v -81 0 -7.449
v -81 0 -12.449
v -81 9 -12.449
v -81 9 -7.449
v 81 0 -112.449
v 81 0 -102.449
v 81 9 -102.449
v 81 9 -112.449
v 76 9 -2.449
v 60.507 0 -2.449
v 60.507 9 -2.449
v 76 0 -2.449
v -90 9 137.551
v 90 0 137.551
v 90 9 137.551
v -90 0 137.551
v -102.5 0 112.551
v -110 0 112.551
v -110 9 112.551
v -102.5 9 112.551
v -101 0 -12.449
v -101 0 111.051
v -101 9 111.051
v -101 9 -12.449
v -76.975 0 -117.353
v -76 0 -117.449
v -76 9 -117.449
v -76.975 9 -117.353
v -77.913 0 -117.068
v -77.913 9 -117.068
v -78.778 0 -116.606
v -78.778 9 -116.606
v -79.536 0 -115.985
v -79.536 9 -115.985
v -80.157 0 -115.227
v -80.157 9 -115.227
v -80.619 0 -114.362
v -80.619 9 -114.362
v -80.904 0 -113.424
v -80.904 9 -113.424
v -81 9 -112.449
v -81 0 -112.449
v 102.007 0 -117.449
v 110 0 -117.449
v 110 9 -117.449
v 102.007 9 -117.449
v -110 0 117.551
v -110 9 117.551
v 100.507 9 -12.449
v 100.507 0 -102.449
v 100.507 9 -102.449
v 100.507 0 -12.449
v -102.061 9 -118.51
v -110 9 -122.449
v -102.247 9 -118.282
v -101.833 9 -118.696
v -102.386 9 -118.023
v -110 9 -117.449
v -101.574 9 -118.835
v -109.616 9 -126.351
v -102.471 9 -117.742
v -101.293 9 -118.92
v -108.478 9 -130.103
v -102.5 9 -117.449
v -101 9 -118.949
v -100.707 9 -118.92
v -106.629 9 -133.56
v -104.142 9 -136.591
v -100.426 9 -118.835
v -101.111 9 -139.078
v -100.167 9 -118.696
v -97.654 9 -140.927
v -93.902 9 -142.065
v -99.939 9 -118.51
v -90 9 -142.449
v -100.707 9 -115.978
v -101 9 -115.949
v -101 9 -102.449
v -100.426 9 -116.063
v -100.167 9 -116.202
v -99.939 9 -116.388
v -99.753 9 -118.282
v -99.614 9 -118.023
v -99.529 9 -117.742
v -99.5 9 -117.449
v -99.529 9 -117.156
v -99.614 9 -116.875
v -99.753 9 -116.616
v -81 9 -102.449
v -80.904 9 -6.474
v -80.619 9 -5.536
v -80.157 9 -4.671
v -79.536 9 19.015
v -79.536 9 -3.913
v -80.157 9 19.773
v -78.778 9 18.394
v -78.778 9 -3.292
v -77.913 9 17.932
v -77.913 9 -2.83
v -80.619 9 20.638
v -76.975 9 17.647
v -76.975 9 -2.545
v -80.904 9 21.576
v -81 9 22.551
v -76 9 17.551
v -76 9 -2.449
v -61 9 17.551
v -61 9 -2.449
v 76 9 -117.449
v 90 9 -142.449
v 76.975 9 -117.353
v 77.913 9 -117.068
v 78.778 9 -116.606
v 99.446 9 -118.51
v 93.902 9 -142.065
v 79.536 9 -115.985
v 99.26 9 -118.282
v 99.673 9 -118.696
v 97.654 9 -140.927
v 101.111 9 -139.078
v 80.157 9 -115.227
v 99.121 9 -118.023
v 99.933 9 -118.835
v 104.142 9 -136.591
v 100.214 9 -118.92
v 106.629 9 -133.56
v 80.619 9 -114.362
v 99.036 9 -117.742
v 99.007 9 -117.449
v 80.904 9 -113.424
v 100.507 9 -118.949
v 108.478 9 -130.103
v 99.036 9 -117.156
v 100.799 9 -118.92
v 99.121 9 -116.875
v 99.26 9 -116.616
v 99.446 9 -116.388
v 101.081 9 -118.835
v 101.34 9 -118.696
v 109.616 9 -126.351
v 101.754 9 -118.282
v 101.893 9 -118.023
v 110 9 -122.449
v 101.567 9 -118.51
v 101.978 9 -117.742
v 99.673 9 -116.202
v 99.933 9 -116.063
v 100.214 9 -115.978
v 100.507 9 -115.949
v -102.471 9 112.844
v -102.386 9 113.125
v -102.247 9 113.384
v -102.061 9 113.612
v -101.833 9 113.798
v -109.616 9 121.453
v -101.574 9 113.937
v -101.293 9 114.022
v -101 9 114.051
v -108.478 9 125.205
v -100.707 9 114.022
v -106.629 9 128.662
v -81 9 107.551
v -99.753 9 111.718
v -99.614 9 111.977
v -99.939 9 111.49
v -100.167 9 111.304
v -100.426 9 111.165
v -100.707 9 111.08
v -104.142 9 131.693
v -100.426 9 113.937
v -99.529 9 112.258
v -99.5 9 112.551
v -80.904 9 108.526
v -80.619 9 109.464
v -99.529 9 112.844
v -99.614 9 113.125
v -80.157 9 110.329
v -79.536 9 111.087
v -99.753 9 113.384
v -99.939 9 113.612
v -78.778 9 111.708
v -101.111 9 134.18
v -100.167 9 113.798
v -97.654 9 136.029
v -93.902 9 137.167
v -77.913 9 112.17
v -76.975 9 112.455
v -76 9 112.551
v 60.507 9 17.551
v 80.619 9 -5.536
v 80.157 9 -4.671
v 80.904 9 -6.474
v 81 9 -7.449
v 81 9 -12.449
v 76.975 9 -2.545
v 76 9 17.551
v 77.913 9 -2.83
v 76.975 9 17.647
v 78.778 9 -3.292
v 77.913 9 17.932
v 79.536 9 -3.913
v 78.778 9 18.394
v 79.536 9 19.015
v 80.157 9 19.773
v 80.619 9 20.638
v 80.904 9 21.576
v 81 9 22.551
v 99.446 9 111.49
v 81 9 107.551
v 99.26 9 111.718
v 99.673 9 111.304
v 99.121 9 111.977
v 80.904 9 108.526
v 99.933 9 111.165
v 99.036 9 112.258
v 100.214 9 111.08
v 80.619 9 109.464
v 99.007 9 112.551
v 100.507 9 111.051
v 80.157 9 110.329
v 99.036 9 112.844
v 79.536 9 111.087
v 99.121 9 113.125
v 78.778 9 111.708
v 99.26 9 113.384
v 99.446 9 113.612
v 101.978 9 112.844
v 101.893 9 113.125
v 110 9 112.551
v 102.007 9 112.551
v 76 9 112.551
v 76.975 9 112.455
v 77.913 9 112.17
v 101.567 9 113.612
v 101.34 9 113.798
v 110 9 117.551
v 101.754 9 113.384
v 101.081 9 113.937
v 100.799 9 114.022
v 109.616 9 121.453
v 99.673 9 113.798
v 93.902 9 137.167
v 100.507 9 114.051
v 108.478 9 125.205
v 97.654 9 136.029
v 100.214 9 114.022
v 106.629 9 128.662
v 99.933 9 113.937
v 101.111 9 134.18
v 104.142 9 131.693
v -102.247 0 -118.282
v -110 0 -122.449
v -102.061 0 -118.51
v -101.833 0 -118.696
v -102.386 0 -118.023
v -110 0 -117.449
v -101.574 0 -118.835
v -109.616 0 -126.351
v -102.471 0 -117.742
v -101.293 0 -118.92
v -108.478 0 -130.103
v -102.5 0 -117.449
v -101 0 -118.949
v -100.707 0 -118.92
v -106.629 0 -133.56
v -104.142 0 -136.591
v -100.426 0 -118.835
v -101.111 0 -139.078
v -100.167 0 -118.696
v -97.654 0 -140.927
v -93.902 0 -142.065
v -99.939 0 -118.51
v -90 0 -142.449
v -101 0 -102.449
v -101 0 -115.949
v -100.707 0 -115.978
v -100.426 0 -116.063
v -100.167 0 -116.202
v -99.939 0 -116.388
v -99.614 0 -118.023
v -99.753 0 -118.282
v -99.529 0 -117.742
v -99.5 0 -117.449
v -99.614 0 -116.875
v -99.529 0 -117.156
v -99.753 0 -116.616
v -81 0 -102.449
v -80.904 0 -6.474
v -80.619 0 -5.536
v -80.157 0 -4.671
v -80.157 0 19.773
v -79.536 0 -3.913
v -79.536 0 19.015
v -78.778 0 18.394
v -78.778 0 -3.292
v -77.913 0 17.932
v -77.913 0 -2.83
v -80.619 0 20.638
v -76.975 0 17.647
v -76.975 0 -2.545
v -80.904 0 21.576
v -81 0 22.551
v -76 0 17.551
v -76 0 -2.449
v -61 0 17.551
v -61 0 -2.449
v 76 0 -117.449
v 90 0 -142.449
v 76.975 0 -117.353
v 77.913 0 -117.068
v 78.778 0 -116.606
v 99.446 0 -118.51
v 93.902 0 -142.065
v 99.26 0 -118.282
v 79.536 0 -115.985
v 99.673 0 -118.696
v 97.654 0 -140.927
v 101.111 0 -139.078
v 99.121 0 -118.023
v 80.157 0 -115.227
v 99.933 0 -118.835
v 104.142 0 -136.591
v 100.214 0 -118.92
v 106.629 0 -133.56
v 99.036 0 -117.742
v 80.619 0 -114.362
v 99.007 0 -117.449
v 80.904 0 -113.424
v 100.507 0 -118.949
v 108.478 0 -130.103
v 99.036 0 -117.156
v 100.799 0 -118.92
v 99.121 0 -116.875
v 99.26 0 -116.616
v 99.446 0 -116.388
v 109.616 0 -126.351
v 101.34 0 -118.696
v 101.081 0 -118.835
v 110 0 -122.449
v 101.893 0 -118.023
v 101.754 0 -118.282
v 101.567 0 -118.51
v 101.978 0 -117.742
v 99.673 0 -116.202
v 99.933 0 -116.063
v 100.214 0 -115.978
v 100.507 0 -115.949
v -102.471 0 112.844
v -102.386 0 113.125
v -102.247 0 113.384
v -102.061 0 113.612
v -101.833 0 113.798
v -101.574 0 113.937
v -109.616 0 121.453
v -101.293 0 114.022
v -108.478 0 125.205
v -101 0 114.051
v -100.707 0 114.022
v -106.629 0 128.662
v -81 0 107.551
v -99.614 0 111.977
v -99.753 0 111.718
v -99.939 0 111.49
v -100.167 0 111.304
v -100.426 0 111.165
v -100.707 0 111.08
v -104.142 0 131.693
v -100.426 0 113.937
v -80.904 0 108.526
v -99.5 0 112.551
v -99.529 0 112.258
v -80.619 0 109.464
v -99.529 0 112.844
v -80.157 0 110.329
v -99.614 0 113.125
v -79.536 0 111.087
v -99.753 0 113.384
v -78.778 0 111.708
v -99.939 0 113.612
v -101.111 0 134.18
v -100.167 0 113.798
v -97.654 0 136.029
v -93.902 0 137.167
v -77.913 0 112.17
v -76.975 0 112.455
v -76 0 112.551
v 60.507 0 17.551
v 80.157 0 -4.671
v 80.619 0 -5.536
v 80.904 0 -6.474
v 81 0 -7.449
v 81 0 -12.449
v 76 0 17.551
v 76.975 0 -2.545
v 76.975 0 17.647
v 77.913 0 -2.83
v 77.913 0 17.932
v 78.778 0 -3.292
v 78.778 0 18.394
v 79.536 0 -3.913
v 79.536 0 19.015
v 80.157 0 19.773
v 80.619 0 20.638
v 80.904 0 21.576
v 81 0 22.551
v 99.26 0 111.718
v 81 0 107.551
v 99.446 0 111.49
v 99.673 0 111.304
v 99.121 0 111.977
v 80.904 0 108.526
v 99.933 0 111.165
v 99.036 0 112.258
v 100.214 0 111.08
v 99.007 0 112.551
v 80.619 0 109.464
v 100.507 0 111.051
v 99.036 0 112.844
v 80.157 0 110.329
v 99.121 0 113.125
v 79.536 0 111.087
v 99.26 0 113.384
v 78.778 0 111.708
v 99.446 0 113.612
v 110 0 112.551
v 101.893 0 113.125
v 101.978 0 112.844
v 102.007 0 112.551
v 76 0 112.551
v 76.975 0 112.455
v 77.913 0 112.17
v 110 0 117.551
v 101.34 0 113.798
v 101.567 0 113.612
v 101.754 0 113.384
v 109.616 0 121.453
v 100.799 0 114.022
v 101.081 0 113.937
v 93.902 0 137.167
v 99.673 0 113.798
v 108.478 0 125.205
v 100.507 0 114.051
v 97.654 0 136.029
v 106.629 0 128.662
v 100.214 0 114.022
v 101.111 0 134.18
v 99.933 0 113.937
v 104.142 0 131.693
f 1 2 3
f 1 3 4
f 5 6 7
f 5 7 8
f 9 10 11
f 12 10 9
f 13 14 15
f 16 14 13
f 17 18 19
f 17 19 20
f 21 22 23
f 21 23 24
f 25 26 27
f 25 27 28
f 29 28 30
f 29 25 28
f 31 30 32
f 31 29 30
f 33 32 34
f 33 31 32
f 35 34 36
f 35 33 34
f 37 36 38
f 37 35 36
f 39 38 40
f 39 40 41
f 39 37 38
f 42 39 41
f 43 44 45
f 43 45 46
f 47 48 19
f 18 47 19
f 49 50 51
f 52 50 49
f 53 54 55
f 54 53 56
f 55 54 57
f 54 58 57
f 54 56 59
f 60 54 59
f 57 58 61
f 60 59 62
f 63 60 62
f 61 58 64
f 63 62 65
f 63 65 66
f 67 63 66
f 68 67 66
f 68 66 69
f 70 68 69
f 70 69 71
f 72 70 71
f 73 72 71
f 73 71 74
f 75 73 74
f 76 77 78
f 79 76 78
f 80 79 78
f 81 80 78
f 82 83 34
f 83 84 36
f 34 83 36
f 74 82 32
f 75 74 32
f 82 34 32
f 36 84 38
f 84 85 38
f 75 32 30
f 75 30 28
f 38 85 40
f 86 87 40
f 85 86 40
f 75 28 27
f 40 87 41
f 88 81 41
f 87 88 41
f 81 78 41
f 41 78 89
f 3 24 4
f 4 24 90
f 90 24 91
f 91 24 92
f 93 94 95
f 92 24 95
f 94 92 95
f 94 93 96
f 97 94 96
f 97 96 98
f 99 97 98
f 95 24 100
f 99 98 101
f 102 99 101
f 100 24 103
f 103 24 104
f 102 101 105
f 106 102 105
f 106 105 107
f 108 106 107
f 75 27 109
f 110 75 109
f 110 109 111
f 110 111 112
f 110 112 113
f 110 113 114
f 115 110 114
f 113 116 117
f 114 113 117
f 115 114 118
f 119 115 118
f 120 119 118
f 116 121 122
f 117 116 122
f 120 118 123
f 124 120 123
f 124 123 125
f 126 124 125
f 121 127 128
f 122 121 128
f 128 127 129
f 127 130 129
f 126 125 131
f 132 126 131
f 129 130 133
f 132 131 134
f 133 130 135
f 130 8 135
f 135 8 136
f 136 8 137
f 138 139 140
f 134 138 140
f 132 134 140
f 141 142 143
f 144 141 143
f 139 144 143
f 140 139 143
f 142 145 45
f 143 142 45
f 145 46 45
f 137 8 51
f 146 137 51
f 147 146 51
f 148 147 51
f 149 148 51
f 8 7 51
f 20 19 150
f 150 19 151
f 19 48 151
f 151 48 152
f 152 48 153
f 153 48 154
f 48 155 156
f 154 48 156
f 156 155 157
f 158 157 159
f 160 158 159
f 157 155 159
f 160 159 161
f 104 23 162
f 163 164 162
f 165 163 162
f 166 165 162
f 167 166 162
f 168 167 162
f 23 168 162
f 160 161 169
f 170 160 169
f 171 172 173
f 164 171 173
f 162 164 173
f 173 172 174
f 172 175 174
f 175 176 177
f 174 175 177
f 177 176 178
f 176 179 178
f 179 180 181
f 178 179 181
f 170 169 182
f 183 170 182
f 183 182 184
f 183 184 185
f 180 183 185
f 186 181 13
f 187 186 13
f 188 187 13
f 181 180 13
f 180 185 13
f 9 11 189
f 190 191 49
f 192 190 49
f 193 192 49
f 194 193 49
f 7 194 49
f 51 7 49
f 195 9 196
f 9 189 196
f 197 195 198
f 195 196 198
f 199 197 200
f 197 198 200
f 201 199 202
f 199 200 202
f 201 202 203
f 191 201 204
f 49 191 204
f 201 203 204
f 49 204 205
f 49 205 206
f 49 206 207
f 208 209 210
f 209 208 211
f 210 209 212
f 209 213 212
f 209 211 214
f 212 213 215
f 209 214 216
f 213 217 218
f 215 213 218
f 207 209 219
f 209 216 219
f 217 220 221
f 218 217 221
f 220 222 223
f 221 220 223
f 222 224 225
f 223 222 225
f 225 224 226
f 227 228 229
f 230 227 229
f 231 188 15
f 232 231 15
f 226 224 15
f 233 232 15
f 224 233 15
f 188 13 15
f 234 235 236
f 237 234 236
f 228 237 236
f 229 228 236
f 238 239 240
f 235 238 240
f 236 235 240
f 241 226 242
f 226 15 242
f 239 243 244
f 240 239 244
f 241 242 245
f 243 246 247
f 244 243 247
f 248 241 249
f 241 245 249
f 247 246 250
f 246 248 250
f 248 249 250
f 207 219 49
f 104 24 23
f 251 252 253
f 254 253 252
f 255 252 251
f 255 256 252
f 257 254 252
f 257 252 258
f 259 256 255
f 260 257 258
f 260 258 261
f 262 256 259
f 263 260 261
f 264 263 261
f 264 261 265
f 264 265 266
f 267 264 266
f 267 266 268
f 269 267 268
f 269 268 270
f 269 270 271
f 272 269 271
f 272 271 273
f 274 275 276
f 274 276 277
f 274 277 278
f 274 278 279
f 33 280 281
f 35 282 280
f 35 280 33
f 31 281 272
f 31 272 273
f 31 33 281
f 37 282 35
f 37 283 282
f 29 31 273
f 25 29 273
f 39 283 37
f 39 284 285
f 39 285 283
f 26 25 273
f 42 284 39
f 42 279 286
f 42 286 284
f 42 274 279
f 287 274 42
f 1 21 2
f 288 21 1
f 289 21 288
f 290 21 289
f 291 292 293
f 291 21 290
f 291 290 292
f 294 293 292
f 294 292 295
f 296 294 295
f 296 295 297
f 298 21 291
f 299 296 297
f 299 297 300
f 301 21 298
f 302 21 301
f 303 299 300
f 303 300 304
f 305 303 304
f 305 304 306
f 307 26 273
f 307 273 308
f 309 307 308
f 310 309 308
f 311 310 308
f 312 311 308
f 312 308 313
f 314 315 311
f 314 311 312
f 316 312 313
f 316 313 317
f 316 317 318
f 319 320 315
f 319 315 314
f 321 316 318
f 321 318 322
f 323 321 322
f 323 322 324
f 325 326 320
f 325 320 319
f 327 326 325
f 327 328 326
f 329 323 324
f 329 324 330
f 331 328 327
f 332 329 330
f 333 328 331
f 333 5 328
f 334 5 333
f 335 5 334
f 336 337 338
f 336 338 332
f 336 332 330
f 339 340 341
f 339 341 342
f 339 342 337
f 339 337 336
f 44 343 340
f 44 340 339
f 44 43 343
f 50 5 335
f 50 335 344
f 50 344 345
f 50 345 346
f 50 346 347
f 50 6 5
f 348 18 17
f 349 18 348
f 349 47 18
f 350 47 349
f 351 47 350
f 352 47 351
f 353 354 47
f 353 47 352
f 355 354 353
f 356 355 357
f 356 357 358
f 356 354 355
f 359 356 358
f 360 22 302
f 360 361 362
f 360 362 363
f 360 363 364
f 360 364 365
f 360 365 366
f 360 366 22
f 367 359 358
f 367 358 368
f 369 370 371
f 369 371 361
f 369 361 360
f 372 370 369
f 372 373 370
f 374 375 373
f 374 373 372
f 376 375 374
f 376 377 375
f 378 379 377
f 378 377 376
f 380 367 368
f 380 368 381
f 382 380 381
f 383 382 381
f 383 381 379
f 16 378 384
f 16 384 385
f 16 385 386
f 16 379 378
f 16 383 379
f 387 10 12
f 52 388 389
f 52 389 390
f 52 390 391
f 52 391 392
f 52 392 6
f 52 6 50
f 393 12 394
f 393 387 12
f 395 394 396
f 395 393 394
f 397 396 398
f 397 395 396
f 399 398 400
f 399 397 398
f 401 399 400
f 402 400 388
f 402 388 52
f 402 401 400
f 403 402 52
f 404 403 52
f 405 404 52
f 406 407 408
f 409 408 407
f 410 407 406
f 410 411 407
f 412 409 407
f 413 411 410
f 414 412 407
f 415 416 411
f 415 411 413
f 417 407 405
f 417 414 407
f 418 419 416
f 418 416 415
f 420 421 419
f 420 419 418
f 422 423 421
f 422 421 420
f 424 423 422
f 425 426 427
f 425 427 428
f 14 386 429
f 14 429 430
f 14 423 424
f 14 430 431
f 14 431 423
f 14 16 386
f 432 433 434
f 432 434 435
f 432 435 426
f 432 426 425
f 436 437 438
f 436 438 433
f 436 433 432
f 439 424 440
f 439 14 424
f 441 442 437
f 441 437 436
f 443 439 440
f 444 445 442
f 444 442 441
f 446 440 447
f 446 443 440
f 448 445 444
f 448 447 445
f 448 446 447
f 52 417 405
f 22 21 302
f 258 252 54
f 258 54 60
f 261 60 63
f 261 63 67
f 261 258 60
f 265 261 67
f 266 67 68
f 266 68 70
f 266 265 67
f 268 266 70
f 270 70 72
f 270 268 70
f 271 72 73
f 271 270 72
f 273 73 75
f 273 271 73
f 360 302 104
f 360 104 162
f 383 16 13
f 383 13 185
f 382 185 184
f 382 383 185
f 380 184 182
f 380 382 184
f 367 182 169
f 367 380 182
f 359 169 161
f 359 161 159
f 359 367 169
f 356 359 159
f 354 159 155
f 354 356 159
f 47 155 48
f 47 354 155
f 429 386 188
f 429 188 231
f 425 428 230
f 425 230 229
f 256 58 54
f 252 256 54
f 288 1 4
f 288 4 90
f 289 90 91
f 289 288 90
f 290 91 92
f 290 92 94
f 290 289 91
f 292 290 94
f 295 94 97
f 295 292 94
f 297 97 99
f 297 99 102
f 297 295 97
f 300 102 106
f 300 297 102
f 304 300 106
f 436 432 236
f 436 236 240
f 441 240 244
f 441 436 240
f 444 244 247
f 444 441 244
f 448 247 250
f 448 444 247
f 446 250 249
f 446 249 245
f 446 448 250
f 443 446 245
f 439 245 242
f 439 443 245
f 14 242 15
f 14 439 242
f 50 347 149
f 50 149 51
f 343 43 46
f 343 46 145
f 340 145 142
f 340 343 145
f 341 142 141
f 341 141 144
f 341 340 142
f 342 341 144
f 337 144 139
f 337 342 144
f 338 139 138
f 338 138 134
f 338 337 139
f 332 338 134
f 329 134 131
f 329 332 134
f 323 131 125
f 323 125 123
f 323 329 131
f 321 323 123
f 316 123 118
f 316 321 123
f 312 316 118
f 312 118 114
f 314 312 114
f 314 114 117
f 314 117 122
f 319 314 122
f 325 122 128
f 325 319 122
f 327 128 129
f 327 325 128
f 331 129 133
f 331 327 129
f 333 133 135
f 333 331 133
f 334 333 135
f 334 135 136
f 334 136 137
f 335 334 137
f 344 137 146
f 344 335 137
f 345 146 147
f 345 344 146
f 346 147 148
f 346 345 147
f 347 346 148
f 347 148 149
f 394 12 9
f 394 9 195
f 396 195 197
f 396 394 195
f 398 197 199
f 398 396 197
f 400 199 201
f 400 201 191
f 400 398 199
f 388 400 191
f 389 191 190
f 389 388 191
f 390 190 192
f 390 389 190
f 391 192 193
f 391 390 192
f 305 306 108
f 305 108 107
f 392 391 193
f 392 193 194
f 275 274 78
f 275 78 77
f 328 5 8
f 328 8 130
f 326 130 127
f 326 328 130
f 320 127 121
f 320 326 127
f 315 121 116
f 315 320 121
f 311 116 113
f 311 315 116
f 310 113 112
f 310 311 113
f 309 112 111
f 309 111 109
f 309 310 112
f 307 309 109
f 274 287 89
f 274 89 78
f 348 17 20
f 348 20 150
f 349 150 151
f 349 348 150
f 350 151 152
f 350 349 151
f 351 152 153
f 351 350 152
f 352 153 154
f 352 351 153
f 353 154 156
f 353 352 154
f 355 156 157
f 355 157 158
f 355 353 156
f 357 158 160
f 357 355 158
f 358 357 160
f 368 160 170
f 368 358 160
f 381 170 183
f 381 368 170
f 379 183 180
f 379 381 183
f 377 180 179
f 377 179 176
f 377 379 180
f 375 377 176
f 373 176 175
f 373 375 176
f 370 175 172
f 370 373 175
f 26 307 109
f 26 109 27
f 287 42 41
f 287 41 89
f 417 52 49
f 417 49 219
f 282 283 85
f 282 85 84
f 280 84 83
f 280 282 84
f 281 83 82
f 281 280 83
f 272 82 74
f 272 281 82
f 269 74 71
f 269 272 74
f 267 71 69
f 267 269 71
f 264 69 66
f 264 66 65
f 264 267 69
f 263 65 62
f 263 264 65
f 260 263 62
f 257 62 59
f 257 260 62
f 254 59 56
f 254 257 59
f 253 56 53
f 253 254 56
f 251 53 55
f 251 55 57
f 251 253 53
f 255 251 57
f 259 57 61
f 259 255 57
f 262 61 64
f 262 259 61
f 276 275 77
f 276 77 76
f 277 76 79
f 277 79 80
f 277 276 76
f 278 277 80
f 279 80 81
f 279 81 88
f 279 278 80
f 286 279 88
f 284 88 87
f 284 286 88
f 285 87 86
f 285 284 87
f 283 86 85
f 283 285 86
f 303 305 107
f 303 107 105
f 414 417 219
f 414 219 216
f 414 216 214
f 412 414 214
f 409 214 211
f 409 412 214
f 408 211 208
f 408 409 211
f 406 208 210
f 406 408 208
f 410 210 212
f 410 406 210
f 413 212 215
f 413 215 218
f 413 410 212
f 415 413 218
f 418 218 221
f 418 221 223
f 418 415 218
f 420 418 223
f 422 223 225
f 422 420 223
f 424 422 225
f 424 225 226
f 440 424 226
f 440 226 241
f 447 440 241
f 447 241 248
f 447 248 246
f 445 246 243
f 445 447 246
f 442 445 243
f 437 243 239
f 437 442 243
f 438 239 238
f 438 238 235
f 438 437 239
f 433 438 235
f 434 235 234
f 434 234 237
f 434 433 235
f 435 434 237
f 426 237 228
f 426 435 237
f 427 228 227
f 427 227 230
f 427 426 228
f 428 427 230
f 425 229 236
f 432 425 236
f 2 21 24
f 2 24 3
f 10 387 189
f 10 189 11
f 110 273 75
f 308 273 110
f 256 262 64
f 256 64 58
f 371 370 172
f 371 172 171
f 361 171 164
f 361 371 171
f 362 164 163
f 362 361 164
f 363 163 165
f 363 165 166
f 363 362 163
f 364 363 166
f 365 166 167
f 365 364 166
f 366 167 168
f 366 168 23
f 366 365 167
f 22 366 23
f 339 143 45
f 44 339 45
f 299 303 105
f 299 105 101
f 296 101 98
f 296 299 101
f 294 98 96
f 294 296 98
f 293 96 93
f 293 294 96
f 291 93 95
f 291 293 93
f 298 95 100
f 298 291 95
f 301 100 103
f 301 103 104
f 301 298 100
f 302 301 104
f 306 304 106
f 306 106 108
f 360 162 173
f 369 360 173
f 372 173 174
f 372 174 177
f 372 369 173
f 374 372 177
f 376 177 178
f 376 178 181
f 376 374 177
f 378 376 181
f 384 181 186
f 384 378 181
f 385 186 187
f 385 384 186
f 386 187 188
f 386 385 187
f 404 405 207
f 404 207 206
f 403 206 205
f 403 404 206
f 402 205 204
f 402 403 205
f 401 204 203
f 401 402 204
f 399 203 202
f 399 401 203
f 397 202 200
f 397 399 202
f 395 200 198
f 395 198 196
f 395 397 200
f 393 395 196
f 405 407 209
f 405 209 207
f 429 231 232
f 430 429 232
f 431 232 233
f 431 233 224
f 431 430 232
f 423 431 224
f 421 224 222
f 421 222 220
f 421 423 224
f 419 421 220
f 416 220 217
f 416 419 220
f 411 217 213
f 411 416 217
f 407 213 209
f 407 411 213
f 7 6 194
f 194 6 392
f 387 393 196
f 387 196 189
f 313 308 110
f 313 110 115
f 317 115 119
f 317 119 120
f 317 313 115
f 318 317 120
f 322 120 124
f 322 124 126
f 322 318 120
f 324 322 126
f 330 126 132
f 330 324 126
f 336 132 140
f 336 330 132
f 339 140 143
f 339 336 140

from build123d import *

# Parameters (mm, degrees)
F0_W     = 19.506821
F0_H     = 90
F1_DEPTH = 9


with BuildPart() as f1:
    # F0 (on Front) → F1 (new body)
    with BuildSketch(Plane.XZ):
        with BuildLine():
            Line((100.506821, -115.94898), (100.506821, -102.44898))
            Line((100.506821, -102.44898), (81, -102.44898))
            Line((81, -102.44898), (81, -112.44898))
            ThreePointArc((81, -112.44898), (79.535534, -115.984513), (76, -117.44898))
            Line((76, -117.44898), (-76, -117.44898))
            ThreePointArc((-76, -117.44898), (-79.535534, -115.984513), (-81, -112.44898))
            Line((-81, -112.44898), (-81, -102.44898))
            Line((-81, -102.44898), (-101, -102.44898))
            Line((-101, -102.44898), (-101, -115.94898))
            ThreePointArc((-101, -115.94898), (-99.93934, -116.388319), (-99.5, -117.44898))
            ThreePointArc((-99.5, -117.44898), (-101, -118.94898), (-102.5, -117.44898))
            Line((-102.5, -117.44898), (-110, -117.44898))
            Line((-110, -117.44898), (-110, -122.44898))
            ThreePointArc((-110, -122.44898), (-104.142136, -136.591115), (-90, -142.44898))
            Line((-90, -142.44898), (90, -142.44898))
            ThreePointArc((90, -142.44898), (104.142136, -136.591115), (110, -122.44898))
            Line((110, -122.44898), (110, -117.44898))
            Line((110, -117.44898), (102.006821, -117.44898))
            ThreePointArc((102.006821, -117.44898), (99.446161, -118.50964), (100.506821, -115.94898))
        make_face()
        with Locations((90.753411, -57.44898)):
            Rectangle(F0_W, F0_H)
        with BuildLine():
            Line((90, 137.55102), (-90, 137.55102))
            ThreePointArc((-90, 137.55102), (-104.142136, 131.693156), (-110, 117.55102))
            Line((-110, 117.55102), (-110, 112.55102))
            Line((-110, 112.55102), (-102.5, 112.55102))
            ThreePointArc((-102.5, 112.55102), (-101, 114.05102), (-99.5, 112.55102))
            ThreePointArc((-99.5, 112.55102), (-99.93934, 111.49036), (-101, 111.05102))
            Line((-101, 111.05102), (-101, -12.44898))
            Line((-101, -12.44898), (-81, -12.44898))
            Line((-81, -12.44898), (-81, -7.44898))
            ThreePointArc((-81, -7.44898), (-79.535534, -3.913446), (-76, -2.44898))
            Line((-76, -2.44898), (-61, -2.44898))
            Line((-61, -2.44898), (-61, 17.55102))
            Line((-61, 17.55102), (-76, 17.55102))
            ThreePointArc((-76, 17.55102), (-79.535534, 19.015487), (-81, 22.55102))
            Line((-81, 22.55102), (-81, 107.55102))
            ThreePointArc((-81, 107.55102), (-79.535534, 111.086554), (-76, 112.55102))
            Line((-76, 112.55102), (76, 112.55102))
            ThreePointArc((76, 112.55102), (79.535534, 111.086554), (81, 107.55102))
            Line((81, 107.55102), (81, 22.55102))
            ThreePointArc((81, 22.55102), (79.535534, 19.015487), (76, 17.55102))
            Line((76, 17.55102), (60.506821, 17.55102))
            Line((60.506821, 17.55102), (60.506821, -2.44898))
            Line((60.506821, -2.44898), (76, -2.44898))
            ThreePointArc((76, -2.44898), (79.535534, -3.913446), (81, -7.44898))
            Line((81, -7.44898), (81, -12.44898))
            Line((81, -12.44898), (100.506821, -12.44898))
            Line((100.506821, -12.44898), (100.506821, 111.05102))
            ThreePointArc((100.506821, 111.05102), (99.446161, 113.611681), (102.006821, 112.55102))
            Line((102.006821, 112.55102), (110, 112.55102))
            Line((110, 112.55102), (110, 117.55102))
            ThreePointArc((110, 117.55102), (104.142136, 131.693156), (90, 137.55102))
        make_face()
    extrude(amount=-F1_DEPTH)


solid = f1.part
